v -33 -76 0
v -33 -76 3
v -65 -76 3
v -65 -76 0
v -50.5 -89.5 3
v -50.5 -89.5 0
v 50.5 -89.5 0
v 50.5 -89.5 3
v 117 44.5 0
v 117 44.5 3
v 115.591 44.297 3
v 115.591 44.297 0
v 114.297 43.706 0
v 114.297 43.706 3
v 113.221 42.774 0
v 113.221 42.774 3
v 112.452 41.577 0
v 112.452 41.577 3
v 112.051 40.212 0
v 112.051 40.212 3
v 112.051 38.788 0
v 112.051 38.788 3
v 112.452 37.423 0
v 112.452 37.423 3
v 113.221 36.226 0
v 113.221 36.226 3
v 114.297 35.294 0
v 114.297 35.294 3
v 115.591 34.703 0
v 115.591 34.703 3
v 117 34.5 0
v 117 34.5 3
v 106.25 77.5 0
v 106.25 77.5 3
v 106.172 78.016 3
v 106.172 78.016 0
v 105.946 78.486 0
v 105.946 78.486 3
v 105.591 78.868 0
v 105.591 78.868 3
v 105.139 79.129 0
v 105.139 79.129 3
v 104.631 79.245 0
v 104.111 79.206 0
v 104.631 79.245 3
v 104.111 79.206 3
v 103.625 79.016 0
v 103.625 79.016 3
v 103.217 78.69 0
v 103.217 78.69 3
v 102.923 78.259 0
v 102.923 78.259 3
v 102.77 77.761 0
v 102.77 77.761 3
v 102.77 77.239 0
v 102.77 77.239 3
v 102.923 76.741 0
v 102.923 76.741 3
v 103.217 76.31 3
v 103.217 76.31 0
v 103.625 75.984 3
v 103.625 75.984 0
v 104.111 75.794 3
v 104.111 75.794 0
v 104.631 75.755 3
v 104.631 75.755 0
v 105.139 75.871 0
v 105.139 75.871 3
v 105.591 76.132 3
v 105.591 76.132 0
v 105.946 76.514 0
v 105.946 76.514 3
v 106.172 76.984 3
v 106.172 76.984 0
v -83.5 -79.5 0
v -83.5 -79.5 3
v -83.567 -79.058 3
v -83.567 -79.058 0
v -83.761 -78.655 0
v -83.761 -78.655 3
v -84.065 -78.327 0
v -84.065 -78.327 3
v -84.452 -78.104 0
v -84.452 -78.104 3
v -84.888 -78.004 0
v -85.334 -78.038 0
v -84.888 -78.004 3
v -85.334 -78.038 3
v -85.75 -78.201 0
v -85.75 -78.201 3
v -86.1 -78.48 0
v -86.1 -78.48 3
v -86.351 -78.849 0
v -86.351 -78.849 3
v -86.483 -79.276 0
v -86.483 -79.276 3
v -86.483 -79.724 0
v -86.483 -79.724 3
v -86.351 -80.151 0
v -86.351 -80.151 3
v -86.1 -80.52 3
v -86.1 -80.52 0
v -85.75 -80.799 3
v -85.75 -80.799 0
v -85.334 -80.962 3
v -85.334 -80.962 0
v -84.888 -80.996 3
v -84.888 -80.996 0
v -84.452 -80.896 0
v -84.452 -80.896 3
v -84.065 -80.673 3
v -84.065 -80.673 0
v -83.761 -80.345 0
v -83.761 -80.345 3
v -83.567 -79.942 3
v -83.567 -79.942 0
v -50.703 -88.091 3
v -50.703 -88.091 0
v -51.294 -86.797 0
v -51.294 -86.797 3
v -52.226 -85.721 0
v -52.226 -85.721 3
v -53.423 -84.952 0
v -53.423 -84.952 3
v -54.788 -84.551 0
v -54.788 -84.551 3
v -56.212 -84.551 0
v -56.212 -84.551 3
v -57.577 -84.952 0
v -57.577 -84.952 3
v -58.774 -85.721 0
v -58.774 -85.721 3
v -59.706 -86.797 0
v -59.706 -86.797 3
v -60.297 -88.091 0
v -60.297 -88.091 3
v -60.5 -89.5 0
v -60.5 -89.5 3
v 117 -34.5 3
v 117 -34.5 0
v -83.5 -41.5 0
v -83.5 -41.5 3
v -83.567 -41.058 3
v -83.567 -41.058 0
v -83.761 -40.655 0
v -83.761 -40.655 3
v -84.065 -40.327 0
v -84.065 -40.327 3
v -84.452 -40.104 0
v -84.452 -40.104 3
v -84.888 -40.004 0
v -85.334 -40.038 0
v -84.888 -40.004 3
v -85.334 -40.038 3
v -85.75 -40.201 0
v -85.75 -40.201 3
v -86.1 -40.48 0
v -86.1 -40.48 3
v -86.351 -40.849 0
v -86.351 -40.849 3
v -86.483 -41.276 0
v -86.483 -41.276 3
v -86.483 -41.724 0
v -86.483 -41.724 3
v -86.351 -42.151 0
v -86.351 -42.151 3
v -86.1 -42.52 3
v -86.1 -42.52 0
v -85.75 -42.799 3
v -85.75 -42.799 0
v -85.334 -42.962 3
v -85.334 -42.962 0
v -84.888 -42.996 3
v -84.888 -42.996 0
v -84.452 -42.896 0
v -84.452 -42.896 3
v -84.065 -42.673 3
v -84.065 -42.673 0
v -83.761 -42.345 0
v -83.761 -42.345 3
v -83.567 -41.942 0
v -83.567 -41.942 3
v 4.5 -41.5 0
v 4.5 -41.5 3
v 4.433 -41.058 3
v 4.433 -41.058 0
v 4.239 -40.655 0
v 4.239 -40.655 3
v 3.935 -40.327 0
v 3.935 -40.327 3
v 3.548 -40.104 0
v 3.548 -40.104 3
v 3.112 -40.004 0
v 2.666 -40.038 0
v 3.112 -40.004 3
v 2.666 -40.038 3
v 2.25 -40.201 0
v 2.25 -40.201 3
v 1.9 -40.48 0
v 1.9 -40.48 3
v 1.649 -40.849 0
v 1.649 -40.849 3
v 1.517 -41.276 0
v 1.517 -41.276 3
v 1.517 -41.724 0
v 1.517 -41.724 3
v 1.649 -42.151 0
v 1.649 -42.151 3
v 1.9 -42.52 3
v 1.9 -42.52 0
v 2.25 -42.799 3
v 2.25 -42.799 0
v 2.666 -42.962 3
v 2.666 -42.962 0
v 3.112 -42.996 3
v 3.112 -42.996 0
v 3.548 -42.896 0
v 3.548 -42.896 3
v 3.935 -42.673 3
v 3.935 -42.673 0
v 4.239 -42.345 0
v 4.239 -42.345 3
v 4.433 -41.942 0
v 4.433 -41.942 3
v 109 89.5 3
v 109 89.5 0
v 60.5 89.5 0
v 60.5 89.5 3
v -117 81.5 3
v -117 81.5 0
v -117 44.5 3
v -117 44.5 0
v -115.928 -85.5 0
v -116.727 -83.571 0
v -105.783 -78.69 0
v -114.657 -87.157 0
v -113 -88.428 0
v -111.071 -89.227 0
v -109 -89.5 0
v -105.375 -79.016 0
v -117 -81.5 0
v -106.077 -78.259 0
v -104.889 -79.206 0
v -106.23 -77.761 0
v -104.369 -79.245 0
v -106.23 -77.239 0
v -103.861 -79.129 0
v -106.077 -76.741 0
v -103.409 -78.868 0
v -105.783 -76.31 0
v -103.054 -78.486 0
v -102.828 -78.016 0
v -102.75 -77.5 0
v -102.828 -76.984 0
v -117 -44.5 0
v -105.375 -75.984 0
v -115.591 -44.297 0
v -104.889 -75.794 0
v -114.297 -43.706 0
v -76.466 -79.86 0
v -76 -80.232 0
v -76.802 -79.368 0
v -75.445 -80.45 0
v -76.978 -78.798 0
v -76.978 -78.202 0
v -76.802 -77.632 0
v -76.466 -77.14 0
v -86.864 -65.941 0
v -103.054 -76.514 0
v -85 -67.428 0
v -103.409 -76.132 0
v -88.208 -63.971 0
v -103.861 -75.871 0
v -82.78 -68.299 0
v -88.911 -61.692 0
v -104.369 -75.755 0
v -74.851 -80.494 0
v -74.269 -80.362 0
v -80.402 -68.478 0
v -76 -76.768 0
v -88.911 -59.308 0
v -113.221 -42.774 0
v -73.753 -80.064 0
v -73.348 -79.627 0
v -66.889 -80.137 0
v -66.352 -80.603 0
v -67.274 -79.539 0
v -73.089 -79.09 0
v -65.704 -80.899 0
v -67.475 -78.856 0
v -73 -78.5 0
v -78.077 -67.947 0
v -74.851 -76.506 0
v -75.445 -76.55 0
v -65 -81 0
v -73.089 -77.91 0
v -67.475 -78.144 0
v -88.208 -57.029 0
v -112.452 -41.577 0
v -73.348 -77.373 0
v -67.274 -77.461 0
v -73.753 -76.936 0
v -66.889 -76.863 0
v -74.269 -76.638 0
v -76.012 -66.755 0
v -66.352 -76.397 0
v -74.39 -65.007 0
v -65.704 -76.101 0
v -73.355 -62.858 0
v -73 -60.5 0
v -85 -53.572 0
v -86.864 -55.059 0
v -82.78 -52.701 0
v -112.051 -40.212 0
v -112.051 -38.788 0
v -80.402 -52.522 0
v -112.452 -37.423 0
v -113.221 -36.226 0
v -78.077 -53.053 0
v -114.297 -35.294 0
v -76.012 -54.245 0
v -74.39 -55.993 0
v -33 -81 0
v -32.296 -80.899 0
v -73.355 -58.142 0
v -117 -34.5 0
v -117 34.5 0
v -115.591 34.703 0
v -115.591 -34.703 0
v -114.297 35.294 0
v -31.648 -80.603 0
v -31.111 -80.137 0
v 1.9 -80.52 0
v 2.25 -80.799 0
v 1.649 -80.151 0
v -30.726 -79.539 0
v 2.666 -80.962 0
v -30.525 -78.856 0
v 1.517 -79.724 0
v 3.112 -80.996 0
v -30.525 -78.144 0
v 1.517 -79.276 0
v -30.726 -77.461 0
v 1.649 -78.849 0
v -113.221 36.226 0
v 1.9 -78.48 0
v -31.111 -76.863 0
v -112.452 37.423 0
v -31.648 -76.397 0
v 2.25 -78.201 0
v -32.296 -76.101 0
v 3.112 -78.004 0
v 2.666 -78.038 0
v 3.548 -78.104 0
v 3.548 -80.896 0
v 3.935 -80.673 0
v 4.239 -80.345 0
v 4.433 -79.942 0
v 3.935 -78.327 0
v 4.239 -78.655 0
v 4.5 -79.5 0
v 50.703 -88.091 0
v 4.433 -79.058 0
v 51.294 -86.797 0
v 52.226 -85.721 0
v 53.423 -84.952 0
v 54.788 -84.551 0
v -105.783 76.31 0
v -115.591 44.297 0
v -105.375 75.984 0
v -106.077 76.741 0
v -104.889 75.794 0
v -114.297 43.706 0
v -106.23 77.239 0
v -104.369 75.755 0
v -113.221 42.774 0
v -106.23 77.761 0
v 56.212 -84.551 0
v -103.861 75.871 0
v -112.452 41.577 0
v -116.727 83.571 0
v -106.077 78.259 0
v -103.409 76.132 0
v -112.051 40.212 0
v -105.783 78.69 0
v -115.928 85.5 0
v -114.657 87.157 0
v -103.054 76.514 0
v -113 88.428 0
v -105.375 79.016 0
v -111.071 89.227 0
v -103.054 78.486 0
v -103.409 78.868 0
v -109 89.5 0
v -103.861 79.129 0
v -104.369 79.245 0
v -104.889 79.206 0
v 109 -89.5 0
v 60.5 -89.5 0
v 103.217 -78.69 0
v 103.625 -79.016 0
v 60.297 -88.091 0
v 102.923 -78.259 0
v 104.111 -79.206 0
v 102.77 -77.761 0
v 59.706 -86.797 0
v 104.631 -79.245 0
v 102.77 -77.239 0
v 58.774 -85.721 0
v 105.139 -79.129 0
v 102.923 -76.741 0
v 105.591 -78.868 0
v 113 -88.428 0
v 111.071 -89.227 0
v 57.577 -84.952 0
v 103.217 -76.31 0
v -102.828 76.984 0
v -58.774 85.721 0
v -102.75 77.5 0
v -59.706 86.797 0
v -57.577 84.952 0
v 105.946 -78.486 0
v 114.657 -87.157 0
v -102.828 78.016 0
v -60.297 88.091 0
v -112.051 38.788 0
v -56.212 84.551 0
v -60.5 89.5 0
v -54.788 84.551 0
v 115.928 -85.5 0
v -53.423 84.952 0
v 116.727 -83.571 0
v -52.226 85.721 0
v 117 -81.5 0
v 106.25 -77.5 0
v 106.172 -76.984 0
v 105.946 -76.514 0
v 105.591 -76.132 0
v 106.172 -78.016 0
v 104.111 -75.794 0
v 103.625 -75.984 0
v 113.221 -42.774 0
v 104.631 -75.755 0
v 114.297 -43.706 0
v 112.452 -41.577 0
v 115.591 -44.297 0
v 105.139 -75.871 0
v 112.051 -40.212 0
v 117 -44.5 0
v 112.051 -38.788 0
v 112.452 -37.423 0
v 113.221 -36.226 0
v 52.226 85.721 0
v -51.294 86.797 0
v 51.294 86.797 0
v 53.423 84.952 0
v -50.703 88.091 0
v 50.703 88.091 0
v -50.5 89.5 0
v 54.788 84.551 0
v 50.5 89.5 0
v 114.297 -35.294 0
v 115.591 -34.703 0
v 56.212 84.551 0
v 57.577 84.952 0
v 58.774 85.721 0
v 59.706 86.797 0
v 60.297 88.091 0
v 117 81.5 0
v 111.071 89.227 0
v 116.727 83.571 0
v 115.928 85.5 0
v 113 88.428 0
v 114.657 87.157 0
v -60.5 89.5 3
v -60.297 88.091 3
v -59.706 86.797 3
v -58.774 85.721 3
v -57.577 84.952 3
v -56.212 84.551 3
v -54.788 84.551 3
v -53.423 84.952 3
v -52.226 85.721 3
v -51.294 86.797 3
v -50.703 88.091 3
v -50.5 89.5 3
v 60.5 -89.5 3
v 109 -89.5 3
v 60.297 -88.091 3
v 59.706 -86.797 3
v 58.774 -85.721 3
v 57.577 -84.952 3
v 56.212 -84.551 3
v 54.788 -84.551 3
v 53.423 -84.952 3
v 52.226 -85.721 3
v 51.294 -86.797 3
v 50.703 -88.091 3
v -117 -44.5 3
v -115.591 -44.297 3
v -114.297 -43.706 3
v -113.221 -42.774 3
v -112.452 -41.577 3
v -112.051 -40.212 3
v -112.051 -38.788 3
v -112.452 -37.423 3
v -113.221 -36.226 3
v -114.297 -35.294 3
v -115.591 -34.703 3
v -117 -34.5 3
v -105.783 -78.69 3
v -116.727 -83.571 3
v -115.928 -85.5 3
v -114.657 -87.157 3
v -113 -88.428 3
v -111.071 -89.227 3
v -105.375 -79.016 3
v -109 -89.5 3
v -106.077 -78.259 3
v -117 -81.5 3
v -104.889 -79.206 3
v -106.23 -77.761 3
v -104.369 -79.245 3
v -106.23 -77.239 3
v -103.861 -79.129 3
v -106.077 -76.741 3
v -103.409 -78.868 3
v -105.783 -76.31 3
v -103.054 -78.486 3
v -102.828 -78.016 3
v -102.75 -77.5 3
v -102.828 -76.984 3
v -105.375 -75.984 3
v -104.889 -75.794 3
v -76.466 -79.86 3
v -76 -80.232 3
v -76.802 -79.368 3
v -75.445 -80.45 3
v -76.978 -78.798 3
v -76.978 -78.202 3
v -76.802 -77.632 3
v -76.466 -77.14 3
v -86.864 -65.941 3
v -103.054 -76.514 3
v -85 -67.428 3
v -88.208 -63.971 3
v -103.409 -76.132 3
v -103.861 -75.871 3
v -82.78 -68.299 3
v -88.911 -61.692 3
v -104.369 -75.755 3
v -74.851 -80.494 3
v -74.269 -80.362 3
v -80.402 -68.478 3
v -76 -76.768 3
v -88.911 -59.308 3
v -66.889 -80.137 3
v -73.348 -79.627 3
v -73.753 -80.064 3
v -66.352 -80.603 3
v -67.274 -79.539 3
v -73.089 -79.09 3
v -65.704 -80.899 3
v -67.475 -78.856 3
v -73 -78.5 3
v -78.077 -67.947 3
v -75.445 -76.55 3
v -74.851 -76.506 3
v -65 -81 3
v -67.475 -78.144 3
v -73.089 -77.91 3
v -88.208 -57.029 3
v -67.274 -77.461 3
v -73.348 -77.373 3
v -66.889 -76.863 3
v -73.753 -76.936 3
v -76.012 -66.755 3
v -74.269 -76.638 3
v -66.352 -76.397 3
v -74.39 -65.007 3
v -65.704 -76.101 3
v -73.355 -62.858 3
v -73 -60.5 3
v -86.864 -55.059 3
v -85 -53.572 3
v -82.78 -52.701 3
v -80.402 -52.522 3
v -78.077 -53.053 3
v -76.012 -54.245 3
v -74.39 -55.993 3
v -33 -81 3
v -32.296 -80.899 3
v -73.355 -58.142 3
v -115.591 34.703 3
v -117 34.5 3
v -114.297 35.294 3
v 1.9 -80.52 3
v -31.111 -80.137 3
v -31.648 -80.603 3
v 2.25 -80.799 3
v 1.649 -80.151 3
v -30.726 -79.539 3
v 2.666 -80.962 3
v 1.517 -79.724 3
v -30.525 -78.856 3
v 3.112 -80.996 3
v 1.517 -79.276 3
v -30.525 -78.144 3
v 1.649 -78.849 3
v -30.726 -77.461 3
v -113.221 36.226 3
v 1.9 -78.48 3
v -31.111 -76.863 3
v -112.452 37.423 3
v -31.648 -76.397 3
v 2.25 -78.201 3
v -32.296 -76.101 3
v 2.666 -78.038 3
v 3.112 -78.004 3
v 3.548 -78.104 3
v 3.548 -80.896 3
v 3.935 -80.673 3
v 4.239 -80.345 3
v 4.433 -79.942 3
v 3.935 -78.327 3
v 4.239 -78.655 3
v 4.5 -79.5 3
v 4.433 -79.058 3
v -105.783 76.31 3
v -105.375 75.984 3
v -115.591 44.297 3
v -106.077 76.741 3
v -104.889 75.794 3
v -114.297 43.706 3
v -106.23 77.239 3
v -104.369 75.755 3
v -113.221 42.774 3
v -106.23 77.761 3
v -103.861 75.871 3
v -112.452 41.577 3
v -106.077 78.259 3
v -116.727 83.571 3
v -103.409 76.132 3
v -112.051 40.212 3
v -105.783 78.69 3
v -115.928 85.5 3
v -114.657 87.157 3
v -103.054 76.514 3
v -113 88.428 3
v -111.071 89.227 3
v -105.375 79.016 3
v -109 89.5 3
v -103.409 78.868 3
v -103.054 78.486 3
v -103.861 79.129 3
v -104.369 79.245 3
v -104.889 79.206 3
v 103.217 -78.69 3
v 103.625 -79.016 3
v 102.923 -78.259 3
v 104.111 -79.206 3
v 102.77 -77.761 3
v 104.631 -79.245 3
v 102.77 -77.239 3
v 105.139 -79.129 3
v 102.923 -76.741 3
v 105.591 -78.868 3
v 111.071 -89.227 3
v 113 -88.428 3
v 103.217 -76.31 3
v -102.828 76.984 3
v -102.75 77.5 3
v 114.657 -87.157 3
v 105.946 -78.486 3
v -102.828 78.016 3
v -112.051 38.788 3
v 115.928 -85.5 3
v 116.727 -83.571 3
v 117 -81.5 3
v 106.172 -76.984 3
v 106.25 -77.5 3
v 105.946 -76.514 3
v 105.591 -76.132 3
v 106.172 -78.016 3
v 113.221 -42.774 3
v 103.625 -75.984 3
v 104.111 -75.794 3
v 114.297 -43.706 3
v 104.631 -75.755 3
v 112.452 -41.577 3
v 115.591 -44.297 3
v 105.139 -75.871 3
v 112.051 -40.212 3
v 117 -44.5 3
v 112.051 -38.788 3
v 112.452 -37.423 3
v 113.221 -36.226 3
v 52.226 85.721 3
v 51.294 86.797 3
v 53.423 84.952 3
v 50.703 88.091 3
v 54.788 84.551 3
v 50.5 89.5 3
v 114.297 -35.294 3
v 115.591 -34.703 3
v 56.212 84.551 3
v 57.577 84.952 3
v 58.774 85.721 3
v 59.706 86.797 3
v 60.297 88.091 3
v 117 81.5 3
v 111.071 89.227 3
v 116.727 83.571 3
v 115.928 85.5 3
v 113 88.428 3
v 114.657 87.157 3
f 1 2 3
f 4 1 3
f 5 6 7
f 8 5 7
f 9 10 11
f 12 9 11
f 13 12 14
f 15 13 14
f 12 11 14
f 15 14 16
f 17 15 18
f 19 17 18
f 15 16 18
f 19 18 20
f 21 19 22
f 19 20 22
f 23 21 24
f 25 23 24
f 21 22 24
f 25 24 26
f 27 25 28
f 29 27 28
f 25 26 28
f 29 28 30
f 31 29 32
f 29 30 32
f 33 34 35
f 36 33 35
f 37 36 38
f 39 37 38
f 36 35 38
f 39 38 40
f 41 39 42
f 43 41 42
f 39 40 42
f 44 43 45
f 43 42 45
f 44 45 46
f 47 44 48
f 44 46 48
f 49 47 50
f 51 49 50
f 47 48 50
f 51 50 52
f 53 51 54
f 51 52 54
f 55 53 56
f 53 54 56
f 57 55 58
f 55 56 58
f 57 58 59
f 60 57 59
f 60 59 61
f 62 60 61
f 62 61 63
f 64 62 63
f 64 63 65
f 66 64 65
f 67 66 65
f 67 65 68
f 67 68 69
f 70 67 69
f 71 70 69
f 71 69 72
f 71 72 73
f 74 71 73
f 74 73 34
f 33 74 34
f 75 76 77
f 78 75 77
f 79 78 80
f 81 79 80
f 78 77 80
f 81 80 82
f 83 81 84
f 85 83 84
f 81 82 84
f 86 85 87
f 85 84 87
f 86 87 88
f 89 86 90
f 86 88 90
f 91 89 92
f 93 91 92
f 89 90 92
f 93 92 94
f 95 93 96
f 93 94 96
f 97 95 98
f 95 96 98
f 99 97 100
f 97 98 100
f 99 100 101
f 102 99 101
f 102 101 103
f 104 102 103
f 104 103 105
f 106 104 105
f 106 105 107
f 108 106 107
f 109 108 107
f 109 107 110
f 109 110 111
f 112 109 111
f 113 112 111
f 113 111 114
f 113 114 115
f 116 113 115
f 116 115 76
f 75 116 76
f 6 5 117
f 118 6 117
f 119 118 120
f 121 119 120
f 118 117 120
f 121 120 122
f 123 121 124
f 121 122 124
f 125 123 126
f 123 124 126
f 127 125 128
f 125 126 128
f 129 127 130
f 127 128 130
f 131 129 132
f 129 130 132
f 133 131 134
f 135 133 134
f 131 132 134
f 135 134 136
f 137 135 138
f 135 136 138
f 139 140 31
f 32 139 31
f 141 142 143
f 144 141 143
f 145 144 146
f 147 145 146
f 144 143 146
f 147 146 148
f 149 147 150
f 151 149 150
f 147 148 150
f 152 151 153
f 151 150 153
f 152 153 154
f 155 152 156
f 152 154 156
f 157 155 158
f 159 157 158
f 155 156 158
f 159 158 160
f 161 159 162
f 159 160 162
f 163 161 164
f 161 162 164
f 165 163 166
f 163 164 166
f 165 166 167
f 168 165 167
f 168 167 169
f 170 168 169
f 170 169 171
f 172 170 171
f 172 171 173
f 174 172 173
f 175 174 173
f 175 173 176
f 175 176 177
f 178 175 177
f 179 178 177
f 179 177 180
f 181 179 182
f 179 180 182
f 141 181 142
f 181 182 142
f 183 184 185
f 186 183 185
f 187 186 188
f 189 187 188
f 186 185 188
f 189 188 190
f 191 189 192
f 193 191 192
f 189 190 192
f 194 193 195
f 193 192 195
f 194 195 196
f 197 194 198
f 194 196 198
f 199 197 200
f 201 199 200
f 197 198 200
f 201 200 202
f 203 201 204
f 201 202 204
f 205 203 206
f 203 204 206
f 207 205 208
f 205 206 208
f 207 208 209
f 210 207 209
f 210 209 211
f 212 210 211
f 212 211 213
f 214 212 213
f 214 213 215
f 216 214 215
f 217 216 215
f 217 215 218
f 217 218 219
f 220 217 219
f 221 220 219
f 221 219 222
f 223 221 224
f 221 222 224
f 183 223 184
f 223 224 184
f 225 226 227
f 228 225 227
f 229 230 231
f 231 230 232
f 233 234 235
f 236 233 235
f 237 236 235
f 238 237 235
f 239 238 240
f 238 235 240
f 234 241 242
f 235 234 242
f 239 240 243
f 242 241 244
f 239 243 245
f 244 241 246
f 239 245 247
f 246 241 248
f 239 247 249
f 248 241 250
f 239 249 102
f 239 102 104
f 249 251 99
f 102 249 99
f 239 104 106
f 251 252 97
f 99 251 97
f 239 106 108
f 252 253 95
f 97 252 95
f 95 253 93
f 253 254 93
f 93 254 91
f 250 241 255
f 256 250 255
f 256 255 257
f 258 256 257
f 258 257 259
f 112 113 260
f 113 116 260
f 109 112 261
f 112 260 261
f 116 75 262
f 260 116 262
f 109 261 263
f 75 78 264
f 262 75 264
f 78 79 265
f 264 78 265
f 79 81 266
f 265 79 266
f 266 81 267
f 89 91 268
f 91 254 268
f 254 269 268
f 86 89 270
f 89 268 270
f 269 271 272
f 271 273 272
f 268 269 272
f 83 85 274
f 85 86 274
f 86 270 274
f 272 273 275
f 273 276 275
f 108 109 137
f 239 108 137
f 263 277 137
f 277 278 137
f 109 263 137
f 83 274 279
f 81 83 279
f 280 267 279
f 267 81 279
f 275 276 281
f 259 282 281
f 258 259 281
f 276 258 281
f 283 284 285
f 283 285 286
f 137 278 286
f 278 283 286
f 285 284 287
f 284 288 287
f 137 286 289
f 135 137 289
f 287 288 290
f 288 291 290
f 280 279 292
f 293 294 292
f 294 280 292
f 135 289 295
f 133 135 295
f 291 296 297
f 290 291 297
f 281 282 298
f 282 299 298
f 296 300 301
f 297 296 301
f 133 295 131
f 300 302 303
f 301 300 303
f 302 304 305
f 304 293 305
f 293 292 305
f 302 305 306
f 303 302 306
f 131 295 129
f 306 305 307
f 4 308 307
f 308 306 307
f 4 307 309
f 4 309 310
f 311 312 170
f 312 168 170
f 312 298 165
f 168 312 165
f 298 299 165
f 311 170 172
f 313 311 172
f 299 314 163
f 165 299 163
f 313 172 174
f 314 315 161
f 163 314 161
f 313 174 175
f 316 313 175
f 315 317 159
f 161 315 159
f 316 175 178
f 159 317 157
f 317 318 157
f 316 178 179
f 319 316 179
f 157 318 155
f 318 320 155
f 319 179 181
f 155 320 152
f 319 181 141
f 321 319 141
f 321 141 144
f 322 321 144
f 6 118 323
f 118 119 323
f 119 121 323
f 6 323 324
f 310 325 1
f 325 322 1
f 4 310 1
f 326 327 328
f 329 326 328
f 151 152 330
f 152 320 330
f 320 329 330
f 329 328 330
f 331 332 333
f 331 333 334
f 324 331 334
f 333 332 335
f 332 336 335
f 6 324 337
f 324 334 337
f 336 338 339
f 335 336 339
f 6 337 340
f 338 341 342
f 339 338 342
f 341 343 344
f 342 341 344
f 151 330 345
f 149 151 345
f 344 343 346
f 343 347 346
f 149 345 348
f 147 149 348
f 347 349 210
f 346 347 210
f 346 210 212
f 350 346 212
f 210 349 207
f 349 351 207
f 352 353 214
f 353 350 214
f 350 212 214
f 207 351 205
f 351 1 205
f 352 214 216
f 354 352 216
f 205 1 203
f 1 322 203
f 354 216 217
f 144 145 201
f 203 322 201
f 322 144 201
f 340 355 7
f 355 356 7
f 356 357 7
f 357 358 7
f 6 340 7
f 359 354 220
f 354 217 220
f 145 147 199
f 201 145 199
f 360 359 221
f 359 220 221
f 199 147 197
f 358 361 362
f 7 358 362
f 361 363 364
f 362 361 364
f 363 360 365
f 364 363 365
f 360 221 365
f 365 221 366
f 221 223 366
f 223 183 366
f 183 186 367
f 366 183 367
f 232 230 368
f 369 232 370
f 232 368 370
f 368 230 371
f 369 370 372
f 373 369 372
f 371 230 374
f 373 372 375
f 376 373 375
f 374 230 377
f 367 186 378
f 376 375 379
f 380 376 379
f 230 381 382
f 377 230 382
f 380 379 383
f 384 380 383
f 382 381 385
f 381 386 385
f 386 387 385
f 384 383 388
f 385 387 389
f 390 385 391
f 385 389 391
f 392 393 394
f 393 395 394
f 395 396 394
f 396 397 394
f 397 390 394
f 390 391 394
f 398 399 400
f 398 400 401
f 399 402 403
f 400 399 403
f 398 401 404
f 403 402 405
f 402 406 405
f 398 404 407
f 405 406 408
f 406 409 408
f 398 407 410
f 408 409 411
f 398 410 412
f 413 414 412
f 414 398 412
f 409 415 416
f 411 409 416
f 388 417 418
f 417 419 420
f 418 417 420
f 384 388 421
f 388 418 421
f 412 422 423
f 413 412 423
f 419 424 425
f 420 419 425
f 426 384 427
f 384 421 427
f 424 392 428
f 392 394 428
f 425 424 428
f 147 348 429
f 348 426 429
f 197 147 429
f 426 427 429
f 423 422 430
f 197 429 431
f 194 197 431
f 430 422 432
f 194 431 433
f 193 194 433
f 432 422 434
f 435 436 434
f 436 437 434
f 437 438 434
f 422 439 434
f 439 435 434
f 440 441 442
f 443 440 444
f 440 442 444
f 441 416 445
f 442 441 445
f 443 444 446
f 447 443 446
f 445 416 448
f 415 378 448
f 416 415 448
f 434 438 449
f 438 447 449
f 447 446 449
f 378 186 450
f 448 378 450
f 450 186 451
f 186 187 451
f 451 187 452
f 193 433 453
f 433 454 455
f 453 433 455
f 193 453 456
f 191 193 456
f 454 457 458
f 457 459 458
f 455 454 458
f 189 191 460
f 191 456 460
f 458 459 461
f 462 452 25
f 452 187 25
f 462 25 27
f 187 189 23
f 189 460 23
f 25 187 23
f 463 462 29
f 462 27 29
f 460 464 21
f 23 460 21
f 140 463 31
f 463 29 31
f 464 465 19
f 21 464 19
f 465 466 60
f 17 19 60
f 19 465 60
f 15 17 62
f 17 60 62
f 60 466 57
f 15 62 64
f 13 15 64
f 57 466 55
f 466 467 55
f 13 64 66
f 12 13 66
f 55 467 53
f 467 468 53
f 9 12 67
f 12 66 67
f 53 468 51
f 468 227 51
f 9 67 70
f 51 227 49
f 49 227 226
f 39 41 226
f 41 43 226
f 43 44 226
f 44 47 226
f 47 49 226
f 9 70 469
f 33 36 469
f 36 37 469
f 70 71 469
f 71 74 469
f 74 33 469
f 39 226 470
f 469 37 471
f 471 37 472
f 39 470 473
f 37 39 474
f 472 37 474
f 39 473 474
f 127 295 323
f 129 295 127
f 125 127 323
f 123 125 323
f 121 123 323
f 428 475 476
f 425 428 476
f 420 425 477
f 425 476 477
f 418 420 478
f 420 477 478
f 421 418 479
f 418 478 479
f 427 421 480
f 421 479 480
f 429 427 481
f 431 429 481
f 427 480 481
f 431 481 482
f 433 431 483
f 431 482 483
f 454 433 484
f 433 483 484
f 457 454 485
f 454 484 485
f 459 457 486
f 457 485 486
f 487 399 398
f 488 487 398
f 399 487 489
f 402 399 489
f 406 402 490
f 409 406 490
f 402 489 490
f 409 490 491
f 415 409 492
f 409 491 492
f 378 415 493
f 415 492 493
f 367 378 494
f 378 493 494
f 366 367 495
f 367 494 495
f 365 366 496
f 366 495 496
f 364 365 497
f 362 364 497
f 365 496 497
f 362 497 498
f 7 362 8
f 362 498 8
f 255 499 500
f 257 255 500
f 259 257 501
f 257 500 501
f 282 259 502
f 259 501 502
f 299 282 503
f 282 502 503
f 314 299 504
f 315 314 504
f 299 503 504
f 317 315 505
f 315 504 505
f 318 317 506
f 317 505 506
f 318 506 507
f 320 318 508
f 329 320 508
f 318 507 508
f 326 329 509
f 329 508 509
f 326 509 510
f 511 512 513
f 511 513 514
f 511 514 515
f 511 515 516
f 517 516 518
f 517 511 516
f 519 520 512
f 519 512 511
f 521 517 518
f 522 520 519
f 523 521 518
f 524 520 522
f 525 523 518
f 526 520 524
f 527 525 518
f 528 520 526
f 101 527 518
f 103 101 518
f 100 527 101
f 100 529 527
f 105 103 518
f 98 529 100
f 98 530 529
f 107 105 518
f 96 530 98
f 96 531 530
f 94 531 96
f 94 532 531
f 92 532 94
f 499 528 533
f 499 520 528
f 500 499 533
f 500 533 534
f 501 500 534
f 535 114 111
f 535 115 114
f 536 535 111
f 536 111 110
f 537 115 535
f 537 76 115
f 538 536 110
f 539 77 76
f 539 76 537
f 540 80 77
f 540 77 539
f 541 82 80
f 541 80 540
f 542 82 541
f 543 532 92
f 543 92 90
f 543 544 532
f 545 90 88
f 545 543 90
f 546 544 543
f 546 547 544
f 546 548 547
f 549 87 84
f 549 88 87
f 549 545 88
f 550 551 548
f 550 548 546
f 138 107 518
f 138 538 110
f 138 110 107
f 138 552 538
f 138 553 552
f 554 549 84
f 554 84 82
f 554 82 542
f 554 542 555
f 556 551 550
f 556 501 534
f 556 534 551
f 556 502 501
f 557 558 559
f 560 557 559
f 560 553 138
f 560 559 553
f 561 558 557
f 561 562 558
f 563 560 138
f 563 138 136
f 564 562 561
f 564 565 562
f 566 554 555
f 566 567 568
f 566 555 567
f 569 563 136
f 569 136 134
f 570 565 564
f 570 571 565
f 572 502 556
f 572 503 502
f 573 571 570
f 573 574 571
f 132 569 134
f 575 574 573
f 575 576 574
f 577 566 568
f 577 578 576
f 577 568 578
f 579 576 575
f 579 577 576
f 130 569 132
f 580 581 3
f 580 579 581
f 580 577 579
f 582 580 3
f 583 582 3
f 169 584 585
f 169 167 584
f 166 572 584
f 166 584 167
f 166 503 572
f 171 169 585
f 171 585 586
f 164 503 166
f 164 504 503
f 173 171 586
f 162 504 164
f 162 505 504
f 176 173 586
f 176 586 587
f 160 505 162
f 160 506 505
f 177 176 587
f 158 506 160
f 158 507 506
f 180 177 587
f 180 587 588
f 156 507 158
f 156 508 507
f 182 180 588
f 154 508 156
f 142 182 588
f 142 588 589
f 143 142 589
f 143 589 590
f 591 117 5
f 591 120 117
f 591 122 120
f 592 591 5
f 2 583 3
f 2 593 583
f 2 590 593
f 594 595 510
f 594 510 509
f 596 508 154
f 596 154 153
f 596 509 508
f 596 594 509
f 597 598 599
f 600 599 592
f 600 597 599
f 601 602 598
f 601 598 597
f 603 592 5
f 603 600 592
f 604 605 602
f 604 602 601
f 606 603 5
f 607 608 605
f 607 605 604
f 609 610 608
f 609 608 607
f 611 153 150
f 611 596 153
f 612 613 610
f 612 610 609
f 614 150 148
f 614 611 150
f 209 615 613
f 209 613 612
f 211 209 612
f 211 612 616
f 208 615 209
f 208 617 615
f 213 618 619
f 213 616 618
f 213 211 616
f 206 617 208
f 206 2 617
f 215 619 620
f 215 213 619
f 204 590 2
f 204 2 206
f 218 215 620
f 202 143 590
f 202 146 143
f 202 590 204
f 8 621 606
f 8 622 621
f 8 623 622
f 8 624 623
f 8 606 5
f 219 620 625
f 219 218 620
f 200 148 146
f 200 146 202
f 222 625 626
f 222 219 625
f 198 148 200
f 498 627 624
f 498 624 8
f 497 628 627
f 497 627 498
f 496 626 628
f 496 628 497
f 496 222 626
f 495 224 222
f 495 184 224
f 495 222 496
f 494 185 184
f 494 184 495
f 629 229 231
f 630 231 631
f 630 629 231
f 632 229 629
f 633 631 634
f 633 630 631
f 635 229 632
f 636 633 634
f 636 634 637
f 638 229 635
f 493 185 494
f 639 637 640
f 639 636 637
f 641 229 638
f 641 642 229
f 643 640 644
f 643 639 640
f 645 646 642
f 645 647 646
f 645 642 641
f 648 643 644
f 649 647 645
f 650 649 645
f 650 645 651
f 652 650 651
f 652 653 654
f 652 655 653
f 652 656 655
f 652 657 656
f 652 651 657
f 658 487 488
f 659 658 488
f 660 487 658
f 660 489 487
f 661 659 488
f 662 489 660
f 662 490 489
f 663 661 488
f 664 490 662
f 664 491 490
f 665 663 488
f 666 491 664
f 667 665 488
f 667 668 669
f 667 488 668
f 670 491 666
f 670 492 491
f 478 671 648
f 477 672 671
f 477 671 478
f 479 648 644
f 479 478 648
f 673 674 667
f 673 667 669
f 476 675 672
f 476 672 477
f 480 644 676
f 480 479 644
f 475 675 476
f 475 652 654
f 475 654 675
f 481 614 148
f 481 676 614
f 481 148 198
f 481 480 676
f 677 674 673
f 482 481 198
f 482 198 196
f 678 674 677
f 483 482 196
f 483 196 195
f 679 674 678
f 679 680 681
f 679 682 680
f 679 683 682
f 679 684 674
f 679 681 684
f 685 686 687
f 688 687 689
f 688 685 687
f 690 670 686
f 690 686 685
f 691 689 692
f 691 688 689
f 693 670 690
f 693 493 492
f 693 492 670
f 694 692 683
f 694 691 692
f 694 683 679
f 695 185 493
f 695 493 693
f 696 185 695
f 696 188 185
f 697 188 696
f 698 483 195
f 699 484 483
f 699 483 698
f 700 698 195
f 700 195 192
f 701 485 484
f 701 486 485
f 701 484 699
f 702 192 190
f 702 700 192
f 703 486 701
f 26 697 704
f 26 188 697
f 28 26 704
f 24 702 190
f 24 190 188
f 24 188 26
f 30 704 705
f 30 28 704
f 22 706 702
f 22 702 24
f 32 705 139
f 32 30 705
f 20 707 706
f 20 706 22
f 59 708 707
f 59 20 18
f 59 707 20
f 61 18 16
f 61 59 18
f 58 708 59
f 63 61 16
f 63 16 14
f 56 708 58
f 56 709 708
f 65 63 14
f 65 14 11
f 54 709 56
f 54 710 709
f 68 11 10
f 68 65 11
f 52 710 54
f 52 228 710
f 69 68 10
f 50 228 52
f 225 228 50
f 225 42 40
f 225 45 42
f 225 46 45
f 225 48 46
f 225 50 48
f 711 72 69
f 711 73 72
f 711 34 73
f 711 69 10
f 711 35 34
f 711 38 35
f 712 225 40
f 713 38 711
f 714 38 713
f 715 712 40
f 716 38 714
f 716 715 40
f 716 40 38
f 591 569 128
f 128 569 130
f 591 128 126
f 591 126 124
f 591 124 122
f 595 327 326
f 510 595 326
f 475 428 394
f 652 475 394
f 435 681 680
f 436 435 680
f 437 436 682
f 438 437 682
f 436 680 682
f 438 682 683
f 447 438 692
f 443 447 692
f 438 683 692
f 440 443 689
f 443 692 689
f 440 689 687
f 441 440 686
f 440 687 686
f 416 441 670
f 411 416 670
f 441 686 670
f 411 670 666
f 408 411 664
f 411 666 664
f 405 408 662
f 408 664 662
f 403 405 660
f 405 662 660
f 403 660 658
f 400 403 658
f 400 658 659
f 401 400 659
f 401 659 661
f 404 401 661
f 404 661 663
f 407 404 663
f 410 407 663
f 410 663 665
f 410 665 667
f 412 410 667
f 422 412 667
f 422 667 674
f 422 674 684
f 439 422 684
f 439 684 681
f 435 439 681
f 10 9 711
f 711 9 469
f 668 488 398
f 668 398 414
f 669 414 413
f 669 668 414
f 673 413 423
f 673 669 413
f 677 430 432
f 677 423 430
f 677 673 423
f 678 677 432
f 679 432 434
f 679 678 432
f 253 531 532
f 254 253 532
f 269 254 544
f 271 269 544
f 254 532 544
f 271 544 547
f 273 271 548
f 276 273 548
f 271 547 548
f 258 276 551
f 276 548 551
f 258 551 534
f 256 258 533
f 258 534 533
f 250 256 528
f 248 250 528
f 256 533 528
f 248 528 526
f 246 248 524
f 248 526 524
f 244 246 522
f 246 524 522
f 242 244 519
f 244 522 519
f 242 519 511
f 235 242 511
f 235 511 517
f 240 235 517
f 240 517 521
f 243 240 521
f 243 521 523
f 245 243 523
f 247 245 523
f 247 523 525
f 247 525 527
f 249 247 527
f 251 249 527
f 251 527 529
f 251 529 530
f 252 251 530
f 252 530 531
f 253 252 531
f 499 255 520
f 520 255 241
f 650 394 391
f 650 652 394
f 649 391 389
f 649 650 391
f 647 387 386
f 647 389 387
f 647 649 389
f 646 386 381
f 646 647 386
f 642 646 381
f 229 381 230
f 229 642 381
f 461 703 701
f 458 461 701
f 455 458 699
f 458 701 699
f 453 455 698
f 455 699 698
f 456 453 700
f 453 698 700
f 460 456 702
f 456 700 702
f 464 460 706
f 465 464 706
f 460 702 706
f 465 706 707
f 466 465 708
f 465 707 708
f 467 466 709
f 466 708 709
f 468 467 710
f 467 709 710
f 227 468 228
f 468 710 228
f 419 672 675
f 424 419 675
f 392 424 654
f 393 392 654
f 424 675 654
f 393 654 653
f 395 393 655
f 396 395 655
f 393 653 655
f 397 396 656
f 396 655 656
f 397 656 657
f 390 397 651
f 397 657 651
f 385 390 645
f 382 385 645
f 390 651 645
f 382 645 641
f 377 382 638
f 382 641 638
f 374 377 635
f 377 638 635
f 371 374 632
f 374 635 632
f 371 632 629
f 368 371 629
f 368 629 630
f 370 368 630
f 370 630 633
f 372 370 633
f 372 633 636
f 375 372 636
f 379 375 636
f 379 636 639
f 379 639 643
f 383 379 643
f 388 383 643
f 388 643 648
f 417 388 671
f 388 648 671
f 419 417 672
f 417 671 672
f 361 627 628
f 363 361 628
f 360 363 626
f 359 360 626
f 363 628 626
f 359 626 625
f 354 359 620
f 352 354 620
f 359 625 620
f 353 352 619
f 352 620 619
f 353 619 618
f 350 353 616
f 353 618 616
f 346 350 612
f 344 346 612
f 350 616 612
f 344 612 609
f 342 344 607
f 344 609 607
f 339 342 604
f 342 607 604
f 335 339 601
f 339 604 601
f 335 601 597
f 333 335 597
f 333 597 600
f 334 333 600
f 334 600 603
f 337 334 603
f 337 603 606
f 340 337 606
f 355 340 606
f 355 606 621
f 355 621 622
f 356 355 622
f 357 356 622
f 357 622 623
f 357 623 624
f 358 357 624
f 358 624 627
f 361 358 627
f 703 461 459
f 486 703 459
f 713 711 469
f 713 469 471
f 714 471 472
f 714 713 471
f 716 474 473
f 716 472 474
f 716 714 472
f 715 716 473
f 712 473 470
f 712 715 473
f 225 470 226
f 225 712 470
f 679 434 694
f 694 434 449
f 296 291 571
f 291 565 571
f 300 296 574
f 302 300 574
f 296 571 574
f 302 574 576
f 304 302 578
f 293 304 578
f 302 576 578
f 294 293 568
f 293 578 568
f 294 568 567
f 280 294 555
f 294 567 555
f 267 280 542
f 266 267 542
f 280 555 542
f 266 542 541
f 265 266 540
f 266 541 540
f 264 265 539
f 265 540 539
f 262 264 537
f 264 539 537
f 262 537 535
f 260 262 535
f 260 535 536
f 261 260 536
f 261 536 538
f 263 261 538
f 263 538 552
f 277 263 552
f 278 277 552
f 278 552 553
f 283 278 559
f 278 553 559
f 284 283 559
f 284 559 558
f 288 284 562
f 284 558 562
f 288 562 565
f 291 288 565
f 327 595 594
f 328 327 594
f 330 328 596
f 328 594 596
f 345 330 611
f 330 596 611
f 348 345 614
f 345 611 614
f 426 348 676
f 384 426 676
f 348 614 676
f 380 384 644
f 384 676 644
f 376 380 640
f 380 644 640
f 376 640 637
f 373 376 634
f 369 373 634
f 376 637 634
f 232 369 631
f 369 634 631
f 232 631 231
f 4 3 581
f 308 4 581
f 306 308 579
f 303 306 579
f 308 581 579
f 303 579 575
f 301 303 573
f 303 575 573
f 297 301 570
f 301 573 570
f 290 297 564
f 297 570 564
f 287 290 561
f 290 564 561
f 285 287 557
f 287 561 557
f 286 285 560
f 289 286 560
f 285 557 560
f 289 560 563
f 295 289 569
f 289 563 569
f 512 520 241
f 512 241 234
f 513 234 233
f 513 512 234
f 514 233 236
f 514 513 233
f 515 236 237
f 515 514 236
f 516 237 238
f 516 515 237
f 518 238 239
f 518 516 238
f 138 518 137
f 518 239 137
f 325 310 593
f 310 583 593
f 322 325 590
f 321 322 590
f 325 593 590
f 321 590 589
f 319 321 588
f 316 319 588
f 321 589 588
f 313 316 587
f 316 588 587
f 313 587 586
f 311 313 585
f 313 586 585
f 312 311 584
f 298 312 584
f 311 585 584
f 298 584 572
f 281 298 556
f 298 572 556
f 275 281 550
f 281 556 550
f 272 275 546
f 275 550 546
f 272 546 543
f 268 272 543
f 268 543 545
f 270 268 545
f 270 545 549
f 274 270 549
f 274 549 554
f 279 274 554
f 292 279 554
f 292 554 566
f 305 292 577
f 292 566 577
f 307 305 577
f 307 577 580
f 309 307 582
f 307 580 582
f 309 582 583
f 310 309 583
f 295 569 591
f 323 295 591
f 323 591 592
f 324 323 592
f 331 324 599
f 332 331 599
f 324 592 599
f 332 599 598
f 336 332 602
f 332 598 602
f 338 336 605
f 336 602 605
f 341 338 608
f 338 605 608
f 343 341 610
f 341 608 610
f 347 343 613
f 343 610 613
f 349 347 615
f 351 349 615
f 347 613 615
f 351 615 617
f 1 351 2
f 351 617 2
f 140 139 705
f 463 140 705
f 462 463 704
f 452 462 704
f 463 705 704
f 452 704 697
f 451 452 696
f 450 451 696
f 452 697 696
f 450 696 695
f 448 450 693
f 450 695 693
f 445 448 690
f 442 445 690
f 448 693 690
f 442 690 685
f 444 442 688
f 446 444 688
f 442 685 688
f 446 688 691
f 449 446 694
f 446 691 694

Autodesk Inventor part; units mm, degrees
ref_plane "YZ Plane" through (0, 0, 0) normal (1, 0, 0) x (0, 1, 0)
ref_plane "XZ Plane" through (0, 0, 0) normal (0, 1, 0) x (-1, 0, 0)
ref_plane "XY Plane" through (0, 0, 0) normal (0, 0, 1) x (1, 0, 0)
sketch "Sketch1" plane through (0, 0, 0) normal (0, 0, 1) x (1, 0, 0)
  line L0 (-117, -89.5) -> (117, -89.5)
  line L1 (117, -89.5) -> (117, 89.5)
  line L2 (117, 89.5) -> (-117, 89.5)
  line L3 (-117, 89.5) -> (-117, -89.5)
  line L4 (-117, -89.5) -> (117, 89.5) construction
  line L5 (117, -89.5) -> (-117, 89.5) construction
  point P0 (0, 0)
  dimension "d0" = 234
  dimension "d1" = 179
extrude "Extrusion1" add sketch "Sketch1" along normal blind 3
fillet "Fillet1" radius 8 4 edges at (117, -89.5, 1.5) (-117, -89.5, 1.5) (-117, 89.5, 1.5) (117, 89.5, 1.5)
sketch "Sketch2" plane through (0, 0, 3) normal (0, 0, 1) x (1, 0, 0)
  line L0 (-109, -89.5) -> (109, -89.5) construction
  arc A0 (-117, -81.5) -> (-109, -89.5) centre (-109, -81.5) ccw projected
  line L1 (-117, 81.5) -> (-117, -81.5) projected
  arc A1 (-109, 89.5) -> (-117, 81.5) centre (-109, 81.5) ccw projected
  line L2 (109, 89.5) -> (-109, 89.5) projected
  arc A2 (117, 81.5) -> (109, 89.5) centre (109, 81.5) ccw projected
  line L3 (117, -81.5) -> (117, 81.5) construction
  arc A3 (109, -89.5) -> (117, -81.5) centre (109, -81.5) ccw construction
  line L4 (-109, -89.5) -> (109, -89.5) projected
  circle A4 centre (55.5, -89.5) radius 5
  line L5 (117, -81.5) -> (117, 81.5) projected
  circle A5 centre (117, -39.5) radius 5
  line L6 (-170.275, 0) -> (170.275, 0) projected
  line L7 (0, 131.775) -> (0, -131.775) projected
  arc A6 (-117, -81.5) -> (-109, -89.5) centre (-109, -81.5) ccw construction
  circle A7 centre (-55.5, -89.5) radius 5
  circle A8 centre (-117, -39.5) radius 5
  line L8 (-109, 89.5) -> (109, 89.5) construction
  arc A9 (-109, 89.5) -> (-117, 81.5) centre (-109, 81.5) ccw
  arc A10 (117, 81.5) -> (109, 89.5) centre (109, 81.5) ccw construction
  line L9 (-109, 89.5) -> (109, 89.5)
  circle A11 centre (55.5, 89.5) radius 5
  circle A12 centre (117, 39.5) radius 5
  circle A13 centre (-117, 39.5) radius 5
  arc A14 (-109, 89.5) -> (-117, 81.5) centre (-109, 81.5) ccw construction
  circle A15 centre (-55.5, 89.5) radius 5
  point P0 (0, 0)
  point P1 (-50.5, -89.5)
  point P2 (-60.5, -89.5)
  point P3 (-117, -34.5)
  point P4 (-117, -44.5)
  point P5 (-117, 44.5)
  point P6 (-117, 34.5)
  point P7 (-60.5, 89.5)
  point P8 (-50.5, 89.5)
  point P9 (50.5, 89.5)
  point P10 (60.5, 89.5)
  point P11 (117, 44.5)
  point P12 (117, 34.5)
  point P13 (117, -34.5)
  point P14 (117, -44.5)
  point P15 (60.5, -89.5)
  point P16 (50.5, -89.5)
  dimension "d5" = 10
  dimension "d6" = 10
  dimension "d7" = 61.5
  dimension "d8" = 50
extrude "Extrusion2" cut sketch "Sketch2" against normal through all contours L5 A5 | A4 L4 | L1 A8 | A7 L4 | L1 A13 | A12 L5 | L2 A11 | A15 L2 picked at (116.6011, -41.1182) picked at (57.1182, -89.1011) picked at (-115.906, -37.9566) picked at (-53.8818, -89.1011) picked at (-115.906, 41.0434) picked at (115.4959, 40.7959) picked at (57.0242, 88.3266) picked at (-53.9758, 88.3266)
sketch "Sketch3" plane through (0, 0, 3) normal (0, 0, 1) x (1, 0, 0)
  circle A0 centre (104.5, -77.5) radius 1.75
  line L0 (117, -34.5) -> (117, 34.5) projected
  line L1 (60.5, -89.5) -> (109, -89.5) construction
  line L2 (0, 127.7397) -> (0, -127.7397) projected
  line L3 (-166.2397, 0) -> (166.2397, 0) projected
  circle A1 centre (-104.5, -77.5) radius 1.75
  circle A2 centre (104.5, 77.5) radius 1.75
  line L4 (60.5, 89.5) -> (109, 89.5) construction
  circle A3 centre (-104.5, 77.5) radius 1.75
  point P0 (0, 0)
  point P1 (-109, -89.5)
  point P2 (-109, 89.5)
  dimension "d11" = 3.5
  dimension "d33" = 209
  dimension "d34" = 155
extrude "Extrusion3" cut sketch "Sketch3" against normal blind 10
sketch "Sketch4" plane through (0, 0, 3) normal (0, 0, 1) x (1, 0, 0)
  circle A0 centre (-81, -60.5) radius 8
  circle A1 centre (-75, -78.5) radius 2
  line L0 (-33, -78.5) -> (-65, -78.5) construction
  line L1 (-33, -76) -> (-65, -76)
  line L2 (-65, -81) -> (-33, -81)
  arc A2 (-33, -81) -> (-33, -76) centre (-33, -78.5) ccw
  arc A3 (-65, -76) -> (-65, -81) centre (-65, -78.5) ccw
  circle A4 centre (-85, -79.5) radius 1.5
  line L3 (-12.5, -60.5) -> (-95.5, -60.5) construction
  line L4 (-41, -83.5) -> (-41, -33.5) construction
  circle A5 centre (3, -79.5) radius 1.5
  circle A6 centre (-85, -41.5) radius 1.5
  circle A7 centre (3, -41.5) radius 1.5
  line L5 (-109, -89.5) -> (-60.5, -89.5) projected
  line L6 (-117, -44.5) -> (-117, -81.5) projected
  point P0 (0, 0)
  point P1 (-49, -78.5)
  dimension "d16" = 2.5
  dimension "d17" = 16
  dimension "d18" = 4
  dimension "d19" = 10
  dimension "d20" = 32
  dimension "d21" = 6
  dimension "d22" = 18
  dimension "d23" = 34
  dimension "d24" = 18
  dimension "d25" = 44
  dimension "d26" = 19
  dimension "d27" = 3
  dimension "d28" = 10
  dimension "d29" = 32
  dimension "d30" = 0
extrude "Extrusion4" cut sketch "Sketch4" against normal through all
sketch "Sketch5" plane through (0, 0, 3) normal (0, 0, 1) x (1, 0, 0)
  circle A0 centre (-81, -60.5) radius 8 projected
  line L0 (-33, -81) -> (-65, -81) projected
  arc A1 (-65, -76) -> (-65, -81) centre (-65, -78.5) ccw projected
  line L1 (-65, -76) -> (-33, -76) projected
  arc A2 (-33, -81) -> (-33, -76) centre (-33, -78.5) ccw projected
  circle A3 centre (-85, -41.5) radius 1.5 projected
  circle A4 centre (3, -41.5) radius 1.5 projected
  circle A5 centre (-75, -78.5) radius 2 projected
  circle A6 centre (-85, -79.5) radius 1.5 projected
  circle A7 centre (3, -79.5) radius 1.5 projected
  circle A8 centre (-104.5, 77.5) radius 1.75 projected
  circle A9 centre (-104.5, -77.5) radius 1.75 projected
  circle A10 centre (104.5, 77.5) radius 1.75 projected
  circle A11 centre (104.5, -77.5) radius 1.75 projected
  arc A12 (117, 44.5) -> (117, 34.5) centre (117, 39.5) ccw projected
  line L2 (117, 44.5) -> (117, 81.5) projected
  arc A13 (117, 81.5) -> (109, 89.5) centre (109, 81.5) ccw projected
  line L3 (109, 89.5) -> (60.5, 89.5) projected
  arc A14 (50.5, 89.5) -> (60.5, 89.5) centre (55.5, 89.5) ccw projected
  line L4 (50.5, 89.5) -> (-50.5, 89.5) projected
  arc A15 (-60.5, 89.5) -> (-50.5, 89.5) centre (-55.5, 89.5) ccw projected
  line L5 (-60.5, 89.5) -> (-109, 89.5) projected
  arc A16 (-109, 89.5) -> (-117, 81.5) centre (-109, 81.5) ccw projected
  line L6 (-117, 81.5) -> (-117, 44.5) projected
  arc A17 (-117, 34.5) -> (-117, 44.5) centre (-117, 39.5) ccw projected
  line L7 (-117, 34.5) -> (-117, -34.5) projected
  arc A18 (-117, -44.5) -> (-117, -34.5) centre (-117, -39.5) ccw projected
  line L8 (-117, -44.5) -> (-117, -81.5) projected
  arc A19 (-117, -81.5) -> (-109, -89.5) centre (-109, -81.5) ccw projected
  line L9 (-109, -89.5) -> (-60.5, -89.5) projected
  arc A20 (-50.5, -89.5) -> (-60.5, -89.5) centre (-55.5, -89.5) ccw projected
  line L10 (-50.5, -89.5) -> (50.5, -89.5) projected
  arc A21 (60.5, -89.5) -> (50.5, -89.5) centre (55.5, -89.5) ccw projected
  line L11 (60.5, -89.5) -> (109, -89.5) projected
  arc A22 (109, -89.5) -> (117, -81.5) centre (109, -81.5) ccw projected
  line L12 (117, -81.5) -> (117, -44.5) projected
  arc A23 (117, -34.5) -> (117, -44.5) centre (117, -39.5) ccw projected
  line L13 (117, -34.5) -> (117, 34.5) projected
  point P0 (0, 0)
equation "\"d6\" = d5"
properties part number "AcrylicCover"
